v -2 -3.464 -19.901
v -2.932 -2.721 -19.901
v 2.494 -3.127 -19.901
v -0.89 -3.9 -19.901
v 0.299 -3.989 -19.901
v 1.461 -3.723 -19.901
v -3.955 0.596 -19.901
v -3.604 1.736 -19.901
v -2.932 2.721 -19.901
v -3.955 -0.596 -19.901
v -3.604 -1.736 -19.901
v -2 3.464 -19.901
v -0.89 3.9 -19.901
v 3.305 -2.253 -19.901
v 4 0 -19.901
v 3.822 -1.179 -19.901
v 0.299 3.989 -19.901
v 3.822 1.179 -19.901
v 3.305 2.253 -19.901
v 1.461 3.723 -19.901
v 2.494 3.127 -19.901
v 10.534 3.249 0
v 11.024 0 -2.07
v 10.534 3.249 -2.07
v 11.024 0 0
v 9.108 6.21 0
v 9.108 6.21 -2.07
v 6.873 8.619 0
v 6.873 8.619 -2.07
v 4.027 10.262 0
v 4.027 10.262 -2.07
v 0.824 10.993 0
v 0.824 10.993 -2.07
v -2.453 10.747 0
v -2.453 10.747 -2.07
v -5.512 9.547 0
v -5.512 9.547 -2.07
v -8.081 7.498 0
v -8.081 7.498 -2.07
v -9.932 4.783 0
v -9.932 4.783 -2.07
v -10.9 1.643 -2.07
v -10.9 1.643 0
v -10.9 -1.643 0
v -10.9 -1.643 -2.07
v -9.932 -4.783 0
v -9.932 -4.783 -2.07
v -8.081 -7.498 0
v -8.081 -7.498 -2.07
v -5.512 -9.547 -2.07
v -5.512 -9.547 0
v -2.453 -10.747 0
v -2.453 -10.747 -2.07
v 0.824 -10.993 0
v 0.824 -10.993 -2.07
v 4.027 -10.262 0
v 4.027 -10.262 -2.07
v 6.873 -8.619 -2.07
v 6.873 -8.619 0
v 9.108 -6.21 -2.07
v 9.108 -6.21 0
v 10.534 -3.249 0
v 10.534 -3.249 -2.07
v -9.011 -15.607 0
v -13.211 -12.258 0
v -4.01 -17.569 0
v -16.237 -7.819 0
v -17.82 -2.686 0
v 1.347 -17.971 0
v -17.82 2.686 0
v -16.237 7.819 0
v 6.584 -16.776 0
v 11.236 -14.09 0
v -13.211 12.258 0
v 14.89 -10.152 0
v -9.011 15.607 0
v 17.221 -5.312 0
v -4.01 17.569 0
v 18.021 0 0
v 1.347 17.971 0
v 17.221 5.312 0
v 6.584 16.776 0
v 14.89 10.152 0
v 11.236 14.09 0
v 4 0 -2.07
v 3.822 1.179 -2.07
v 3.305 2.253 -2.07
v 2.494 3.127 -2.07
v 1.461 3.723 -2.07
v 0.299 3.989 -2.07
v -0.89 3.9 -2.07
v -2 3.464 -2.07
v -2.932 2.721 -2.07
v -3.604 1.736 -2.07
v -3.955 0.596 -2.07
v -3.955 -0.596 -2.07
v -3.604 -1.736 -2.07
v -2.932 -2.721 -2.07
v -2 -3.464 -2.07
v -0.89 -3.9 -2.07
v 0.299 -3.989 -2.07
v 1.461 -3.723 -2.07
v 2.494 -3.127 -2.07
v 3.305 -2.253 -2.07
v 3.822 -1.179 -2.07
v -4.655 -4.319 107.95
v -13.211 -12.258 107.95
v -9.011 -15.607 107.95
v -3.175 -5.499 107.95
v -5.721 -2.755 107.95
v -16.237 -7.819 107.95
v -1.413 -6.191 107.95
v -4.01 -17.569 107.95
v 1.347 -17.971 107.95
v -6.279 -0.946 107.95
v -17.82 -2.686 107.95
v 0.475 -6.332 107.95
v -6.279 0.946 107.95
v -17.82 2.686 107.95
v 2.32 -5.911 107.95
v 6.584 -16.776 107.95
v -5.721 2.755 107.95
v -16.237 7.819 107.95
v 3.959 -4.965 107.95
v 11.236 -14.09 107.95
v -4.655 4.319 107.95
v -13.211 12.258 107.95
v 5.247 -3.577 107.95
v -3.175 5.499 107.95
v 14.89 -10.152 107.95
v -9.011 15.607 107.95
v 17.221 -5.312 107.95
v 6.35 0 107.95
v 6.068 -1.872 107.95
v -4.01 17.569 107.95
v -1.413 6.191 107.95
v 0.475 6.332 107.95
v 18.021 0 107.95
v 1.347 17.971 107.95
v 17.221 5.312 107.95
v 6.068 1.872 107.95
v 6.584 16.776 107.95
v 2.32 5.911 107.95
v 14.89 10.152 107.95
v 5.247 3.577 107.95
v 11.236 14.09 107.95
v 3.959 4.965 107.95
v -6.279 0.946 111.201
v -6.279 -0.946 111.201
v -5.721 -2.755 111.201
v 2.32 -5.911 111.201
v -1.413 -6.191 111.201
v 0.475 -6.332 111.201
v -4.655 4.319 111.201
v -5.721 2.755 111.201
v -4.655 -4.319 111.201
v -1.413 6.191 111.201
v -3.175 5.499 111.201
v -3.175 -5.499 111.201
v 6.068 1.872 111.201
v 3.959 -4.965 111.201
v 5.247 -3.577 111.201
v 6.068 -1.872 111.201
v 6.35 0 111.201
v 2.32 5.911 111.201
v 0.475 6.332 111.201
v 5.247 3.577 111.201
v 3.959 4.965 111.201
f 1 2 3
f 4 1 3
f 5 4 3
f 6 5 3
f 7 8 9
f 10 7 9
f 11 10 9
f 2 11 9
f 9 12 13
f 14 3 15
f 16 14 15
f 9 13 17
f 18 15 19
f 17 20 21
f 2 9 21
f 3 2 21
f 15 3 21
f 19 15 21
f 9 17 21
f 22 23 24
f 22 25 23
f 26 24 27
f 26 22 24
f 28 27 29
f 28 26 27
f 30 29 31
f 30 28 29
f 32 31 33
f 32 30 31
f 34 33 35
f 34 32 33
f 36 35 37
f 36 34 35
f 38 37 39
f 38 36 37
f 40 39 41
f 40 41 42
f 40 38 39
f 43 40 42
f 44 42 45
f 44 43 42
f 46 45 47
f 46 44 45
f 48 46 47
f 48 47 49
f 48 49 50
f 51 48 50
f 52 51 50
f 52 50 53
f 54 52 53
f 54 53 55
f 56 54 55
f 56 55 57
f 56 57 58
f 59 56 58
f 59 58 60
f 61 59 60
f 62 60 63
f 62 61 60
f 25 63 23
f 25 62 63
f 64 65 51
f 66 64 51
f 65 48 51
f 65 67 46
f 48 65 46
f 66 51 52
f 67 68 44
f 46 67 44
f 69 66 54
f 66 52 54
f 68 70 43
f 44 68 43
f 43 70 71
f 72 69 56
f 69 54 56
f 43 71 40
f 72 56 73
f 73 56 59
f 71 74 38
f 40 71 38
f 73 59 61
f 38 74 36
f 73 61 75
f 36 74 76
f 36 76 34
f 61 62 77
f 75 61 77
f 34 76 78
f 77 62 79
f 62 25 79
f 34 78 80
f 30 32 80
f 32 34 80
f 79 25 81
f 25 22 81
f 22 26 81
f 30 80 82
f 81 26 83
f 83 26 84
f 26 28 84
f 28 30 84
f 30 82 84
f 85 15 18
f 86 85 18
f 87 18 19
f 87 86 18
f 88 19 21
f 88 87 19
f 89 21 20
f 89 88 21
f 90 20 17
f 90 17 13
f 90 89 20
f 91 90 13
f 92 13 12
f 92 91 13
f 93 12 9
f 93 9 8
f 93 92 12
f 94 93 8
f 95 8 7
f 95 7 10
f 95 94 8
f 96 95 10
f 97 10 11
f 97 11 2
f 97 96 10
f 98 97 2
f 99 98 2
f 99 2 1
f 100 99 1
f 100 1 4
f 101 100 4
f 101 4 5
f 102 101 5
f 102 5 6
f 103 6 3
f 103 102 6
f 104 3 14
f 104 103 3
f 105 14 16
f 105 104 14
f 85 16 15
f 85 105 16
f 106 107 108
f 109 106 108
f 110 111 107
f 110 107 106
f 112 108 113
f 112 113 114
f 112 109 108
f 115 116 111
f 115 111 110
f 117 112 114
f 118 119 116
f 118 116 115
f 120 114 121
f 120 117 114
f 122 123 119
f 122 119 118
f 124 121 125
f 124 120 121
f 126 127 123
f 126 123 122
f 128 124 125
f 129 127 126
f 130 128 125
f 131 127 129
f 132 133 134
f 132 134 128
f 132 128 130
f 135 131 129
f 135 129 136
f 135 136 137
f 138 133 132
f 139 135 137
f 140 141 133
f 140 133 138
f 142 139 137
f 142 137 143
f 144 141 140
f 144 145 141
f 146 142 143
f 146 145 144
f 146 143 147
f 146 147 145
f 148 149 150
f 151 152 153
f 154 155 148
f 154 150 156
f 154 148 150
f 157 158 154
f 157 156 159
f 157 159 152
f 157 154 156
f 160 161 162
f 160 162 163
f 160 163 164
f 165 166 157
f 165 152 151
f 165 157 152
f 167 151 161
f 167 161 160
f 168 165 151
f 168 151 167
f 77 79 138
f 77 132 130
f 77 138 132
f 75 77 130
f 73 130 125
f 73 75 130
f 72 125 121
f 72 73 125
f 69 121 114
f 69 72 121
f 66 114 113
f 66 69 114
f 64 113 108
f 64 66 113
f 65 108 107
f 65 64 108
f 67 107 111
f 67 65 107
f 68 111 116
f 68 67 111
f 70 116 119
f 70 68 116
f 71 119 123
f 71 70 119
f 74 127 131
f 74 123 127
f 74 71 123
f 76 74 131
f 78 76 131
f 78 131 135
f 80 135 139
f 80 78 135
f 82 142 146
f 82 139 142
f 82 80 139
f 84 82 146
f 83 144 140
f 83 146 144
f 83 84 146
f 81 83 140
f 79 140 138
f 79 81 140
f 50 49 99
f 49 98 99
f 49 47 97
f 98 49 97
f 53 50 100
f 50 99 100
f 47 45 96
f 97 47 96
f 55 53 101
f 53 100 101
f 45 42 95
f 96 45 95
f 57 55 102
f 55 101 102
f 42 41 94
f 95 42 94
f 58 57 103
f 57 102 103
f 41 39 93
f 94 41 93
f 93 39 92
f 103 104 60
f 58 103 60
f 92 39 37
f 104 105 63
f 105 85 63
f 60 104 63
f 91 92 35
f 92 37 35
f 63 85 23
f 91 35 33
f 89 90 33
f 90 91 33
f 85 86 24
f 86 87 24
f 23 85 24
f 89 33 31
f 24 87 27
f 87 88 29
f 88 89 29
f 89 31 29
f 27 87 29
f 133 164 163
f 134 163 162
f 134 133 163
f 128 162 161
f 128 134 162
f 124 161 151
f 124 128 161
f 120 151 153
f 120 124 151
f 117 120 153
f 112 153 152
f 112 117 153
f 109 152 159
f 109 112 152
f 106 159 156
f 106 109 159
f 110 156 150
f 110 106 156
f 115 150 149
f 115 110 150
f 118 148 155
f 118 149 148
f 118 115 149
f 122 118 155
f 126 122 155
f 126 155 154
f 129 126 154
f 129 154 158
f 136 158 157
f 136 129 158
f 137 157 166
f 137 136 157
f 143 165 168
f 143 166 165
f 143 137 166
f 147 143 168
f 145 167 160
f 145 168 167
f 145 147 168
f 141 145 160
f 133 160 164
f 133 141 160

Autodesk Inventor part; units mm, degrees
ref_plane "YZ Plane" through (0, 0, 0) normal (1, 0, 0) x (0, 1, 0)
ref_plane "XZ Plane" through (0, 0, 0) normal (0, 1, 0) x (-1, 0, 0)
ref_plane "XY Plane" through (0, 0, 0) normal (0, 0, 1) x (1, 0, 0)
sketch "Sketch1" plane through (0, 0, 0) normal (0, 0, 1) x (1, 0, 0)
  circle A0 centre (0, 0) radius 18.0213
  circle A1 centre (0, 0) radius 4
  circle A2 centre (0, 0) radius 11.0236
  circle A3 centre (0, 0) radius 6.35
  dimension "d0" = 36.0426
  dimension "d1" = 8
  dimension "d2" = 22.0472
  dimension "d9" = 12.7
extrude "Extrusion1" add sketch "Sketch1" along normal blind 107.95 contours A0 | A1 | A2 | A3
extrude "Extrusion2" add sketch "Sketch1" against normal blind 2.0701 contours A2 | A3
extrude "Extrusion3" add sketch "Sketch1" against normal blind 19.9009 contours A1
extrude "Extrusion4" add sketch "Sketch1" along normal blind 111.2012 contours A1 | A3
properties part number "DriveMotor"
